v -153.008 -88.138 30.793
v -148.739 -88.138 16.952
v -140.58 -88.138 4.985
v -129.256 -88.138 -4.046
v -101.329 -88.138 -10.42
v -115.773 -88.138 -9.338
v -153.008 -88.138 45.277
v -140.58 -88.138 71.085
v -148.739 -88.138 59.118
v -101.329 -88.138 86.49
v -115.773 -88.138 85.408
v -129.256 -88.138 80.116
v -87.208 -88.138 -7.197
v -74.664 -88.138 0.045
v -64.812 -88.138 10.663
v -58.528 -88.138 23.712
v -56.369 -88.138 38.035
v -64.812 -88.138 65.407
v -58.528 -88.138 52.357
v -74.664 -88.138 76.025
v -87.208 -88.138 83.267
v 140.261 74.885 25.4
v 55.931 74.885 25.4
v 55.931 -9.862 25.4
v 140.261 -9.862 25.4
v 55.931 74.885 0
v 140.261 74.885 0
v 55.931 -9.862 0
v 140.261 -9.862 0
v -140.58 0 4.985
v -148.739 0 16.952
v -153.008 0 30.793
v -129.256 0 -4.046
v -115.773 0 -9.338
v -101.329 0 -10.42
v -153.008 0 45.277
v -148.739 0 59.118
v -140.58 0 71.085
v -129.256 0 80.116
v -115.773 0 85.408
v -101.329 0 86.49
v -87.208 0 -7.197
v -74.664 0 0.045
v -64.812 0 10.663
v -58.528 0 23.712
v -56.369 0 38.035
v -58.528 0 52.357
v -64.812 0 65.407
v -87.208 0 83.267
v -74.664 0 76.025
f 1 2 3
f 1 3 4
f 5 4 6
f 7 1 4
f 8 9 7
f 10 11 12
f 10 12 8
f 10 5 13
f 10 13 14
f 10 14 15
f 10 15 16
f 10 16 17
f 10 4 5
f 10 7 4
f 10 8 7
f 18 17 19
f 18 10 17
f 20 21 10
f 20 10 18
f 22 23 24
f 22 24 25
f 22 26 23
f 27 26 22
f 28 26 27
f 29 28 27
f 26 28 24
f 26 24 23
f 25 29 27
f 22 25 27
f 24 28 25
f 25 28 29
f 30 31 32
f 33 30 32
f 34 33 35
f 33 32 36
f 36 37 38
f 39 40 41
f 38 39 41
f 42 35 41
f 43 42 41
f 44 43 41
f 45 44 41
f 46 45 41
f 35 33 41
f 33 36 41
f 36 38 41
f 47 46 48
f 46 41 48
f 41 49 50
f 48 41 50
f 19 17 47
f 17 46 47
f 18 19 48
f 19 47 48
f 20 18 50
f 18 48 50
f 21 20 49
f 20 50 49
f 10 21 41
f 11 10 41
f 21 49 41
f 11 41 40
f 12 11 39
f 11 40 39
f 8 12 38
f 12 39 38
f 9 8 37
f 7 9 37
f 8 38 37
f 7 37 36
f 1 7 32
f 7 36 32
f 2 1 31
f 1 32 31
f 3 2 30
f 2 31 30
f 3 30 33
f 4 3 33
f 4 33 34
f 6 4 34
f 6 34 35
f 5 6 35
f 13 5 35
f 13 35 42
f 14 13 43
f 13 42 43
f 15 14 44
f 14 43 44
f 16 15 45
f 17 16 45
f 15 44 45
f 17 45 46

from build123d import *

# Parameters (mm, degrees)
F0_R      = 48.590936
F1_DEPTH  = 25.4
F1_FACE_R = 48.590936
F2_DEPTH  = 62.738
F3_W      = 84.329299
F3_H      = 84.746515
F4_DEPTH  = 25.4


with BuildPart() as f1:
    # F0 (on Front) → F1 (new body)
    with BuildSketch(Plane.XZ):
        with Locations((-104.960032, 38.034886)):
            Circle(F0_R)
    extrude(amount=F1_DEPTH)

    # F1_face (on face) → F2 (join)
    with BuildSketch(Plane(origin=(-104.960032, -25.4, 38.034886), x_dir=(1, 0, 0), z_dir=(0, -1, 0))):
        Circle(F1_FACE_R)
    extrude(amount=F2_DEPTH)


with BuildPart() as f4:
    # F3 (on Top) → F4 (new body)
    with BuildSketch(Plane.XY):
        with Locations((98.095898, 32.511365)):
            Rectangle(F3_W, F3_H)
    extrude(amount=F4_DEPTH)


solid = Compound([f1.part, f4.part])
